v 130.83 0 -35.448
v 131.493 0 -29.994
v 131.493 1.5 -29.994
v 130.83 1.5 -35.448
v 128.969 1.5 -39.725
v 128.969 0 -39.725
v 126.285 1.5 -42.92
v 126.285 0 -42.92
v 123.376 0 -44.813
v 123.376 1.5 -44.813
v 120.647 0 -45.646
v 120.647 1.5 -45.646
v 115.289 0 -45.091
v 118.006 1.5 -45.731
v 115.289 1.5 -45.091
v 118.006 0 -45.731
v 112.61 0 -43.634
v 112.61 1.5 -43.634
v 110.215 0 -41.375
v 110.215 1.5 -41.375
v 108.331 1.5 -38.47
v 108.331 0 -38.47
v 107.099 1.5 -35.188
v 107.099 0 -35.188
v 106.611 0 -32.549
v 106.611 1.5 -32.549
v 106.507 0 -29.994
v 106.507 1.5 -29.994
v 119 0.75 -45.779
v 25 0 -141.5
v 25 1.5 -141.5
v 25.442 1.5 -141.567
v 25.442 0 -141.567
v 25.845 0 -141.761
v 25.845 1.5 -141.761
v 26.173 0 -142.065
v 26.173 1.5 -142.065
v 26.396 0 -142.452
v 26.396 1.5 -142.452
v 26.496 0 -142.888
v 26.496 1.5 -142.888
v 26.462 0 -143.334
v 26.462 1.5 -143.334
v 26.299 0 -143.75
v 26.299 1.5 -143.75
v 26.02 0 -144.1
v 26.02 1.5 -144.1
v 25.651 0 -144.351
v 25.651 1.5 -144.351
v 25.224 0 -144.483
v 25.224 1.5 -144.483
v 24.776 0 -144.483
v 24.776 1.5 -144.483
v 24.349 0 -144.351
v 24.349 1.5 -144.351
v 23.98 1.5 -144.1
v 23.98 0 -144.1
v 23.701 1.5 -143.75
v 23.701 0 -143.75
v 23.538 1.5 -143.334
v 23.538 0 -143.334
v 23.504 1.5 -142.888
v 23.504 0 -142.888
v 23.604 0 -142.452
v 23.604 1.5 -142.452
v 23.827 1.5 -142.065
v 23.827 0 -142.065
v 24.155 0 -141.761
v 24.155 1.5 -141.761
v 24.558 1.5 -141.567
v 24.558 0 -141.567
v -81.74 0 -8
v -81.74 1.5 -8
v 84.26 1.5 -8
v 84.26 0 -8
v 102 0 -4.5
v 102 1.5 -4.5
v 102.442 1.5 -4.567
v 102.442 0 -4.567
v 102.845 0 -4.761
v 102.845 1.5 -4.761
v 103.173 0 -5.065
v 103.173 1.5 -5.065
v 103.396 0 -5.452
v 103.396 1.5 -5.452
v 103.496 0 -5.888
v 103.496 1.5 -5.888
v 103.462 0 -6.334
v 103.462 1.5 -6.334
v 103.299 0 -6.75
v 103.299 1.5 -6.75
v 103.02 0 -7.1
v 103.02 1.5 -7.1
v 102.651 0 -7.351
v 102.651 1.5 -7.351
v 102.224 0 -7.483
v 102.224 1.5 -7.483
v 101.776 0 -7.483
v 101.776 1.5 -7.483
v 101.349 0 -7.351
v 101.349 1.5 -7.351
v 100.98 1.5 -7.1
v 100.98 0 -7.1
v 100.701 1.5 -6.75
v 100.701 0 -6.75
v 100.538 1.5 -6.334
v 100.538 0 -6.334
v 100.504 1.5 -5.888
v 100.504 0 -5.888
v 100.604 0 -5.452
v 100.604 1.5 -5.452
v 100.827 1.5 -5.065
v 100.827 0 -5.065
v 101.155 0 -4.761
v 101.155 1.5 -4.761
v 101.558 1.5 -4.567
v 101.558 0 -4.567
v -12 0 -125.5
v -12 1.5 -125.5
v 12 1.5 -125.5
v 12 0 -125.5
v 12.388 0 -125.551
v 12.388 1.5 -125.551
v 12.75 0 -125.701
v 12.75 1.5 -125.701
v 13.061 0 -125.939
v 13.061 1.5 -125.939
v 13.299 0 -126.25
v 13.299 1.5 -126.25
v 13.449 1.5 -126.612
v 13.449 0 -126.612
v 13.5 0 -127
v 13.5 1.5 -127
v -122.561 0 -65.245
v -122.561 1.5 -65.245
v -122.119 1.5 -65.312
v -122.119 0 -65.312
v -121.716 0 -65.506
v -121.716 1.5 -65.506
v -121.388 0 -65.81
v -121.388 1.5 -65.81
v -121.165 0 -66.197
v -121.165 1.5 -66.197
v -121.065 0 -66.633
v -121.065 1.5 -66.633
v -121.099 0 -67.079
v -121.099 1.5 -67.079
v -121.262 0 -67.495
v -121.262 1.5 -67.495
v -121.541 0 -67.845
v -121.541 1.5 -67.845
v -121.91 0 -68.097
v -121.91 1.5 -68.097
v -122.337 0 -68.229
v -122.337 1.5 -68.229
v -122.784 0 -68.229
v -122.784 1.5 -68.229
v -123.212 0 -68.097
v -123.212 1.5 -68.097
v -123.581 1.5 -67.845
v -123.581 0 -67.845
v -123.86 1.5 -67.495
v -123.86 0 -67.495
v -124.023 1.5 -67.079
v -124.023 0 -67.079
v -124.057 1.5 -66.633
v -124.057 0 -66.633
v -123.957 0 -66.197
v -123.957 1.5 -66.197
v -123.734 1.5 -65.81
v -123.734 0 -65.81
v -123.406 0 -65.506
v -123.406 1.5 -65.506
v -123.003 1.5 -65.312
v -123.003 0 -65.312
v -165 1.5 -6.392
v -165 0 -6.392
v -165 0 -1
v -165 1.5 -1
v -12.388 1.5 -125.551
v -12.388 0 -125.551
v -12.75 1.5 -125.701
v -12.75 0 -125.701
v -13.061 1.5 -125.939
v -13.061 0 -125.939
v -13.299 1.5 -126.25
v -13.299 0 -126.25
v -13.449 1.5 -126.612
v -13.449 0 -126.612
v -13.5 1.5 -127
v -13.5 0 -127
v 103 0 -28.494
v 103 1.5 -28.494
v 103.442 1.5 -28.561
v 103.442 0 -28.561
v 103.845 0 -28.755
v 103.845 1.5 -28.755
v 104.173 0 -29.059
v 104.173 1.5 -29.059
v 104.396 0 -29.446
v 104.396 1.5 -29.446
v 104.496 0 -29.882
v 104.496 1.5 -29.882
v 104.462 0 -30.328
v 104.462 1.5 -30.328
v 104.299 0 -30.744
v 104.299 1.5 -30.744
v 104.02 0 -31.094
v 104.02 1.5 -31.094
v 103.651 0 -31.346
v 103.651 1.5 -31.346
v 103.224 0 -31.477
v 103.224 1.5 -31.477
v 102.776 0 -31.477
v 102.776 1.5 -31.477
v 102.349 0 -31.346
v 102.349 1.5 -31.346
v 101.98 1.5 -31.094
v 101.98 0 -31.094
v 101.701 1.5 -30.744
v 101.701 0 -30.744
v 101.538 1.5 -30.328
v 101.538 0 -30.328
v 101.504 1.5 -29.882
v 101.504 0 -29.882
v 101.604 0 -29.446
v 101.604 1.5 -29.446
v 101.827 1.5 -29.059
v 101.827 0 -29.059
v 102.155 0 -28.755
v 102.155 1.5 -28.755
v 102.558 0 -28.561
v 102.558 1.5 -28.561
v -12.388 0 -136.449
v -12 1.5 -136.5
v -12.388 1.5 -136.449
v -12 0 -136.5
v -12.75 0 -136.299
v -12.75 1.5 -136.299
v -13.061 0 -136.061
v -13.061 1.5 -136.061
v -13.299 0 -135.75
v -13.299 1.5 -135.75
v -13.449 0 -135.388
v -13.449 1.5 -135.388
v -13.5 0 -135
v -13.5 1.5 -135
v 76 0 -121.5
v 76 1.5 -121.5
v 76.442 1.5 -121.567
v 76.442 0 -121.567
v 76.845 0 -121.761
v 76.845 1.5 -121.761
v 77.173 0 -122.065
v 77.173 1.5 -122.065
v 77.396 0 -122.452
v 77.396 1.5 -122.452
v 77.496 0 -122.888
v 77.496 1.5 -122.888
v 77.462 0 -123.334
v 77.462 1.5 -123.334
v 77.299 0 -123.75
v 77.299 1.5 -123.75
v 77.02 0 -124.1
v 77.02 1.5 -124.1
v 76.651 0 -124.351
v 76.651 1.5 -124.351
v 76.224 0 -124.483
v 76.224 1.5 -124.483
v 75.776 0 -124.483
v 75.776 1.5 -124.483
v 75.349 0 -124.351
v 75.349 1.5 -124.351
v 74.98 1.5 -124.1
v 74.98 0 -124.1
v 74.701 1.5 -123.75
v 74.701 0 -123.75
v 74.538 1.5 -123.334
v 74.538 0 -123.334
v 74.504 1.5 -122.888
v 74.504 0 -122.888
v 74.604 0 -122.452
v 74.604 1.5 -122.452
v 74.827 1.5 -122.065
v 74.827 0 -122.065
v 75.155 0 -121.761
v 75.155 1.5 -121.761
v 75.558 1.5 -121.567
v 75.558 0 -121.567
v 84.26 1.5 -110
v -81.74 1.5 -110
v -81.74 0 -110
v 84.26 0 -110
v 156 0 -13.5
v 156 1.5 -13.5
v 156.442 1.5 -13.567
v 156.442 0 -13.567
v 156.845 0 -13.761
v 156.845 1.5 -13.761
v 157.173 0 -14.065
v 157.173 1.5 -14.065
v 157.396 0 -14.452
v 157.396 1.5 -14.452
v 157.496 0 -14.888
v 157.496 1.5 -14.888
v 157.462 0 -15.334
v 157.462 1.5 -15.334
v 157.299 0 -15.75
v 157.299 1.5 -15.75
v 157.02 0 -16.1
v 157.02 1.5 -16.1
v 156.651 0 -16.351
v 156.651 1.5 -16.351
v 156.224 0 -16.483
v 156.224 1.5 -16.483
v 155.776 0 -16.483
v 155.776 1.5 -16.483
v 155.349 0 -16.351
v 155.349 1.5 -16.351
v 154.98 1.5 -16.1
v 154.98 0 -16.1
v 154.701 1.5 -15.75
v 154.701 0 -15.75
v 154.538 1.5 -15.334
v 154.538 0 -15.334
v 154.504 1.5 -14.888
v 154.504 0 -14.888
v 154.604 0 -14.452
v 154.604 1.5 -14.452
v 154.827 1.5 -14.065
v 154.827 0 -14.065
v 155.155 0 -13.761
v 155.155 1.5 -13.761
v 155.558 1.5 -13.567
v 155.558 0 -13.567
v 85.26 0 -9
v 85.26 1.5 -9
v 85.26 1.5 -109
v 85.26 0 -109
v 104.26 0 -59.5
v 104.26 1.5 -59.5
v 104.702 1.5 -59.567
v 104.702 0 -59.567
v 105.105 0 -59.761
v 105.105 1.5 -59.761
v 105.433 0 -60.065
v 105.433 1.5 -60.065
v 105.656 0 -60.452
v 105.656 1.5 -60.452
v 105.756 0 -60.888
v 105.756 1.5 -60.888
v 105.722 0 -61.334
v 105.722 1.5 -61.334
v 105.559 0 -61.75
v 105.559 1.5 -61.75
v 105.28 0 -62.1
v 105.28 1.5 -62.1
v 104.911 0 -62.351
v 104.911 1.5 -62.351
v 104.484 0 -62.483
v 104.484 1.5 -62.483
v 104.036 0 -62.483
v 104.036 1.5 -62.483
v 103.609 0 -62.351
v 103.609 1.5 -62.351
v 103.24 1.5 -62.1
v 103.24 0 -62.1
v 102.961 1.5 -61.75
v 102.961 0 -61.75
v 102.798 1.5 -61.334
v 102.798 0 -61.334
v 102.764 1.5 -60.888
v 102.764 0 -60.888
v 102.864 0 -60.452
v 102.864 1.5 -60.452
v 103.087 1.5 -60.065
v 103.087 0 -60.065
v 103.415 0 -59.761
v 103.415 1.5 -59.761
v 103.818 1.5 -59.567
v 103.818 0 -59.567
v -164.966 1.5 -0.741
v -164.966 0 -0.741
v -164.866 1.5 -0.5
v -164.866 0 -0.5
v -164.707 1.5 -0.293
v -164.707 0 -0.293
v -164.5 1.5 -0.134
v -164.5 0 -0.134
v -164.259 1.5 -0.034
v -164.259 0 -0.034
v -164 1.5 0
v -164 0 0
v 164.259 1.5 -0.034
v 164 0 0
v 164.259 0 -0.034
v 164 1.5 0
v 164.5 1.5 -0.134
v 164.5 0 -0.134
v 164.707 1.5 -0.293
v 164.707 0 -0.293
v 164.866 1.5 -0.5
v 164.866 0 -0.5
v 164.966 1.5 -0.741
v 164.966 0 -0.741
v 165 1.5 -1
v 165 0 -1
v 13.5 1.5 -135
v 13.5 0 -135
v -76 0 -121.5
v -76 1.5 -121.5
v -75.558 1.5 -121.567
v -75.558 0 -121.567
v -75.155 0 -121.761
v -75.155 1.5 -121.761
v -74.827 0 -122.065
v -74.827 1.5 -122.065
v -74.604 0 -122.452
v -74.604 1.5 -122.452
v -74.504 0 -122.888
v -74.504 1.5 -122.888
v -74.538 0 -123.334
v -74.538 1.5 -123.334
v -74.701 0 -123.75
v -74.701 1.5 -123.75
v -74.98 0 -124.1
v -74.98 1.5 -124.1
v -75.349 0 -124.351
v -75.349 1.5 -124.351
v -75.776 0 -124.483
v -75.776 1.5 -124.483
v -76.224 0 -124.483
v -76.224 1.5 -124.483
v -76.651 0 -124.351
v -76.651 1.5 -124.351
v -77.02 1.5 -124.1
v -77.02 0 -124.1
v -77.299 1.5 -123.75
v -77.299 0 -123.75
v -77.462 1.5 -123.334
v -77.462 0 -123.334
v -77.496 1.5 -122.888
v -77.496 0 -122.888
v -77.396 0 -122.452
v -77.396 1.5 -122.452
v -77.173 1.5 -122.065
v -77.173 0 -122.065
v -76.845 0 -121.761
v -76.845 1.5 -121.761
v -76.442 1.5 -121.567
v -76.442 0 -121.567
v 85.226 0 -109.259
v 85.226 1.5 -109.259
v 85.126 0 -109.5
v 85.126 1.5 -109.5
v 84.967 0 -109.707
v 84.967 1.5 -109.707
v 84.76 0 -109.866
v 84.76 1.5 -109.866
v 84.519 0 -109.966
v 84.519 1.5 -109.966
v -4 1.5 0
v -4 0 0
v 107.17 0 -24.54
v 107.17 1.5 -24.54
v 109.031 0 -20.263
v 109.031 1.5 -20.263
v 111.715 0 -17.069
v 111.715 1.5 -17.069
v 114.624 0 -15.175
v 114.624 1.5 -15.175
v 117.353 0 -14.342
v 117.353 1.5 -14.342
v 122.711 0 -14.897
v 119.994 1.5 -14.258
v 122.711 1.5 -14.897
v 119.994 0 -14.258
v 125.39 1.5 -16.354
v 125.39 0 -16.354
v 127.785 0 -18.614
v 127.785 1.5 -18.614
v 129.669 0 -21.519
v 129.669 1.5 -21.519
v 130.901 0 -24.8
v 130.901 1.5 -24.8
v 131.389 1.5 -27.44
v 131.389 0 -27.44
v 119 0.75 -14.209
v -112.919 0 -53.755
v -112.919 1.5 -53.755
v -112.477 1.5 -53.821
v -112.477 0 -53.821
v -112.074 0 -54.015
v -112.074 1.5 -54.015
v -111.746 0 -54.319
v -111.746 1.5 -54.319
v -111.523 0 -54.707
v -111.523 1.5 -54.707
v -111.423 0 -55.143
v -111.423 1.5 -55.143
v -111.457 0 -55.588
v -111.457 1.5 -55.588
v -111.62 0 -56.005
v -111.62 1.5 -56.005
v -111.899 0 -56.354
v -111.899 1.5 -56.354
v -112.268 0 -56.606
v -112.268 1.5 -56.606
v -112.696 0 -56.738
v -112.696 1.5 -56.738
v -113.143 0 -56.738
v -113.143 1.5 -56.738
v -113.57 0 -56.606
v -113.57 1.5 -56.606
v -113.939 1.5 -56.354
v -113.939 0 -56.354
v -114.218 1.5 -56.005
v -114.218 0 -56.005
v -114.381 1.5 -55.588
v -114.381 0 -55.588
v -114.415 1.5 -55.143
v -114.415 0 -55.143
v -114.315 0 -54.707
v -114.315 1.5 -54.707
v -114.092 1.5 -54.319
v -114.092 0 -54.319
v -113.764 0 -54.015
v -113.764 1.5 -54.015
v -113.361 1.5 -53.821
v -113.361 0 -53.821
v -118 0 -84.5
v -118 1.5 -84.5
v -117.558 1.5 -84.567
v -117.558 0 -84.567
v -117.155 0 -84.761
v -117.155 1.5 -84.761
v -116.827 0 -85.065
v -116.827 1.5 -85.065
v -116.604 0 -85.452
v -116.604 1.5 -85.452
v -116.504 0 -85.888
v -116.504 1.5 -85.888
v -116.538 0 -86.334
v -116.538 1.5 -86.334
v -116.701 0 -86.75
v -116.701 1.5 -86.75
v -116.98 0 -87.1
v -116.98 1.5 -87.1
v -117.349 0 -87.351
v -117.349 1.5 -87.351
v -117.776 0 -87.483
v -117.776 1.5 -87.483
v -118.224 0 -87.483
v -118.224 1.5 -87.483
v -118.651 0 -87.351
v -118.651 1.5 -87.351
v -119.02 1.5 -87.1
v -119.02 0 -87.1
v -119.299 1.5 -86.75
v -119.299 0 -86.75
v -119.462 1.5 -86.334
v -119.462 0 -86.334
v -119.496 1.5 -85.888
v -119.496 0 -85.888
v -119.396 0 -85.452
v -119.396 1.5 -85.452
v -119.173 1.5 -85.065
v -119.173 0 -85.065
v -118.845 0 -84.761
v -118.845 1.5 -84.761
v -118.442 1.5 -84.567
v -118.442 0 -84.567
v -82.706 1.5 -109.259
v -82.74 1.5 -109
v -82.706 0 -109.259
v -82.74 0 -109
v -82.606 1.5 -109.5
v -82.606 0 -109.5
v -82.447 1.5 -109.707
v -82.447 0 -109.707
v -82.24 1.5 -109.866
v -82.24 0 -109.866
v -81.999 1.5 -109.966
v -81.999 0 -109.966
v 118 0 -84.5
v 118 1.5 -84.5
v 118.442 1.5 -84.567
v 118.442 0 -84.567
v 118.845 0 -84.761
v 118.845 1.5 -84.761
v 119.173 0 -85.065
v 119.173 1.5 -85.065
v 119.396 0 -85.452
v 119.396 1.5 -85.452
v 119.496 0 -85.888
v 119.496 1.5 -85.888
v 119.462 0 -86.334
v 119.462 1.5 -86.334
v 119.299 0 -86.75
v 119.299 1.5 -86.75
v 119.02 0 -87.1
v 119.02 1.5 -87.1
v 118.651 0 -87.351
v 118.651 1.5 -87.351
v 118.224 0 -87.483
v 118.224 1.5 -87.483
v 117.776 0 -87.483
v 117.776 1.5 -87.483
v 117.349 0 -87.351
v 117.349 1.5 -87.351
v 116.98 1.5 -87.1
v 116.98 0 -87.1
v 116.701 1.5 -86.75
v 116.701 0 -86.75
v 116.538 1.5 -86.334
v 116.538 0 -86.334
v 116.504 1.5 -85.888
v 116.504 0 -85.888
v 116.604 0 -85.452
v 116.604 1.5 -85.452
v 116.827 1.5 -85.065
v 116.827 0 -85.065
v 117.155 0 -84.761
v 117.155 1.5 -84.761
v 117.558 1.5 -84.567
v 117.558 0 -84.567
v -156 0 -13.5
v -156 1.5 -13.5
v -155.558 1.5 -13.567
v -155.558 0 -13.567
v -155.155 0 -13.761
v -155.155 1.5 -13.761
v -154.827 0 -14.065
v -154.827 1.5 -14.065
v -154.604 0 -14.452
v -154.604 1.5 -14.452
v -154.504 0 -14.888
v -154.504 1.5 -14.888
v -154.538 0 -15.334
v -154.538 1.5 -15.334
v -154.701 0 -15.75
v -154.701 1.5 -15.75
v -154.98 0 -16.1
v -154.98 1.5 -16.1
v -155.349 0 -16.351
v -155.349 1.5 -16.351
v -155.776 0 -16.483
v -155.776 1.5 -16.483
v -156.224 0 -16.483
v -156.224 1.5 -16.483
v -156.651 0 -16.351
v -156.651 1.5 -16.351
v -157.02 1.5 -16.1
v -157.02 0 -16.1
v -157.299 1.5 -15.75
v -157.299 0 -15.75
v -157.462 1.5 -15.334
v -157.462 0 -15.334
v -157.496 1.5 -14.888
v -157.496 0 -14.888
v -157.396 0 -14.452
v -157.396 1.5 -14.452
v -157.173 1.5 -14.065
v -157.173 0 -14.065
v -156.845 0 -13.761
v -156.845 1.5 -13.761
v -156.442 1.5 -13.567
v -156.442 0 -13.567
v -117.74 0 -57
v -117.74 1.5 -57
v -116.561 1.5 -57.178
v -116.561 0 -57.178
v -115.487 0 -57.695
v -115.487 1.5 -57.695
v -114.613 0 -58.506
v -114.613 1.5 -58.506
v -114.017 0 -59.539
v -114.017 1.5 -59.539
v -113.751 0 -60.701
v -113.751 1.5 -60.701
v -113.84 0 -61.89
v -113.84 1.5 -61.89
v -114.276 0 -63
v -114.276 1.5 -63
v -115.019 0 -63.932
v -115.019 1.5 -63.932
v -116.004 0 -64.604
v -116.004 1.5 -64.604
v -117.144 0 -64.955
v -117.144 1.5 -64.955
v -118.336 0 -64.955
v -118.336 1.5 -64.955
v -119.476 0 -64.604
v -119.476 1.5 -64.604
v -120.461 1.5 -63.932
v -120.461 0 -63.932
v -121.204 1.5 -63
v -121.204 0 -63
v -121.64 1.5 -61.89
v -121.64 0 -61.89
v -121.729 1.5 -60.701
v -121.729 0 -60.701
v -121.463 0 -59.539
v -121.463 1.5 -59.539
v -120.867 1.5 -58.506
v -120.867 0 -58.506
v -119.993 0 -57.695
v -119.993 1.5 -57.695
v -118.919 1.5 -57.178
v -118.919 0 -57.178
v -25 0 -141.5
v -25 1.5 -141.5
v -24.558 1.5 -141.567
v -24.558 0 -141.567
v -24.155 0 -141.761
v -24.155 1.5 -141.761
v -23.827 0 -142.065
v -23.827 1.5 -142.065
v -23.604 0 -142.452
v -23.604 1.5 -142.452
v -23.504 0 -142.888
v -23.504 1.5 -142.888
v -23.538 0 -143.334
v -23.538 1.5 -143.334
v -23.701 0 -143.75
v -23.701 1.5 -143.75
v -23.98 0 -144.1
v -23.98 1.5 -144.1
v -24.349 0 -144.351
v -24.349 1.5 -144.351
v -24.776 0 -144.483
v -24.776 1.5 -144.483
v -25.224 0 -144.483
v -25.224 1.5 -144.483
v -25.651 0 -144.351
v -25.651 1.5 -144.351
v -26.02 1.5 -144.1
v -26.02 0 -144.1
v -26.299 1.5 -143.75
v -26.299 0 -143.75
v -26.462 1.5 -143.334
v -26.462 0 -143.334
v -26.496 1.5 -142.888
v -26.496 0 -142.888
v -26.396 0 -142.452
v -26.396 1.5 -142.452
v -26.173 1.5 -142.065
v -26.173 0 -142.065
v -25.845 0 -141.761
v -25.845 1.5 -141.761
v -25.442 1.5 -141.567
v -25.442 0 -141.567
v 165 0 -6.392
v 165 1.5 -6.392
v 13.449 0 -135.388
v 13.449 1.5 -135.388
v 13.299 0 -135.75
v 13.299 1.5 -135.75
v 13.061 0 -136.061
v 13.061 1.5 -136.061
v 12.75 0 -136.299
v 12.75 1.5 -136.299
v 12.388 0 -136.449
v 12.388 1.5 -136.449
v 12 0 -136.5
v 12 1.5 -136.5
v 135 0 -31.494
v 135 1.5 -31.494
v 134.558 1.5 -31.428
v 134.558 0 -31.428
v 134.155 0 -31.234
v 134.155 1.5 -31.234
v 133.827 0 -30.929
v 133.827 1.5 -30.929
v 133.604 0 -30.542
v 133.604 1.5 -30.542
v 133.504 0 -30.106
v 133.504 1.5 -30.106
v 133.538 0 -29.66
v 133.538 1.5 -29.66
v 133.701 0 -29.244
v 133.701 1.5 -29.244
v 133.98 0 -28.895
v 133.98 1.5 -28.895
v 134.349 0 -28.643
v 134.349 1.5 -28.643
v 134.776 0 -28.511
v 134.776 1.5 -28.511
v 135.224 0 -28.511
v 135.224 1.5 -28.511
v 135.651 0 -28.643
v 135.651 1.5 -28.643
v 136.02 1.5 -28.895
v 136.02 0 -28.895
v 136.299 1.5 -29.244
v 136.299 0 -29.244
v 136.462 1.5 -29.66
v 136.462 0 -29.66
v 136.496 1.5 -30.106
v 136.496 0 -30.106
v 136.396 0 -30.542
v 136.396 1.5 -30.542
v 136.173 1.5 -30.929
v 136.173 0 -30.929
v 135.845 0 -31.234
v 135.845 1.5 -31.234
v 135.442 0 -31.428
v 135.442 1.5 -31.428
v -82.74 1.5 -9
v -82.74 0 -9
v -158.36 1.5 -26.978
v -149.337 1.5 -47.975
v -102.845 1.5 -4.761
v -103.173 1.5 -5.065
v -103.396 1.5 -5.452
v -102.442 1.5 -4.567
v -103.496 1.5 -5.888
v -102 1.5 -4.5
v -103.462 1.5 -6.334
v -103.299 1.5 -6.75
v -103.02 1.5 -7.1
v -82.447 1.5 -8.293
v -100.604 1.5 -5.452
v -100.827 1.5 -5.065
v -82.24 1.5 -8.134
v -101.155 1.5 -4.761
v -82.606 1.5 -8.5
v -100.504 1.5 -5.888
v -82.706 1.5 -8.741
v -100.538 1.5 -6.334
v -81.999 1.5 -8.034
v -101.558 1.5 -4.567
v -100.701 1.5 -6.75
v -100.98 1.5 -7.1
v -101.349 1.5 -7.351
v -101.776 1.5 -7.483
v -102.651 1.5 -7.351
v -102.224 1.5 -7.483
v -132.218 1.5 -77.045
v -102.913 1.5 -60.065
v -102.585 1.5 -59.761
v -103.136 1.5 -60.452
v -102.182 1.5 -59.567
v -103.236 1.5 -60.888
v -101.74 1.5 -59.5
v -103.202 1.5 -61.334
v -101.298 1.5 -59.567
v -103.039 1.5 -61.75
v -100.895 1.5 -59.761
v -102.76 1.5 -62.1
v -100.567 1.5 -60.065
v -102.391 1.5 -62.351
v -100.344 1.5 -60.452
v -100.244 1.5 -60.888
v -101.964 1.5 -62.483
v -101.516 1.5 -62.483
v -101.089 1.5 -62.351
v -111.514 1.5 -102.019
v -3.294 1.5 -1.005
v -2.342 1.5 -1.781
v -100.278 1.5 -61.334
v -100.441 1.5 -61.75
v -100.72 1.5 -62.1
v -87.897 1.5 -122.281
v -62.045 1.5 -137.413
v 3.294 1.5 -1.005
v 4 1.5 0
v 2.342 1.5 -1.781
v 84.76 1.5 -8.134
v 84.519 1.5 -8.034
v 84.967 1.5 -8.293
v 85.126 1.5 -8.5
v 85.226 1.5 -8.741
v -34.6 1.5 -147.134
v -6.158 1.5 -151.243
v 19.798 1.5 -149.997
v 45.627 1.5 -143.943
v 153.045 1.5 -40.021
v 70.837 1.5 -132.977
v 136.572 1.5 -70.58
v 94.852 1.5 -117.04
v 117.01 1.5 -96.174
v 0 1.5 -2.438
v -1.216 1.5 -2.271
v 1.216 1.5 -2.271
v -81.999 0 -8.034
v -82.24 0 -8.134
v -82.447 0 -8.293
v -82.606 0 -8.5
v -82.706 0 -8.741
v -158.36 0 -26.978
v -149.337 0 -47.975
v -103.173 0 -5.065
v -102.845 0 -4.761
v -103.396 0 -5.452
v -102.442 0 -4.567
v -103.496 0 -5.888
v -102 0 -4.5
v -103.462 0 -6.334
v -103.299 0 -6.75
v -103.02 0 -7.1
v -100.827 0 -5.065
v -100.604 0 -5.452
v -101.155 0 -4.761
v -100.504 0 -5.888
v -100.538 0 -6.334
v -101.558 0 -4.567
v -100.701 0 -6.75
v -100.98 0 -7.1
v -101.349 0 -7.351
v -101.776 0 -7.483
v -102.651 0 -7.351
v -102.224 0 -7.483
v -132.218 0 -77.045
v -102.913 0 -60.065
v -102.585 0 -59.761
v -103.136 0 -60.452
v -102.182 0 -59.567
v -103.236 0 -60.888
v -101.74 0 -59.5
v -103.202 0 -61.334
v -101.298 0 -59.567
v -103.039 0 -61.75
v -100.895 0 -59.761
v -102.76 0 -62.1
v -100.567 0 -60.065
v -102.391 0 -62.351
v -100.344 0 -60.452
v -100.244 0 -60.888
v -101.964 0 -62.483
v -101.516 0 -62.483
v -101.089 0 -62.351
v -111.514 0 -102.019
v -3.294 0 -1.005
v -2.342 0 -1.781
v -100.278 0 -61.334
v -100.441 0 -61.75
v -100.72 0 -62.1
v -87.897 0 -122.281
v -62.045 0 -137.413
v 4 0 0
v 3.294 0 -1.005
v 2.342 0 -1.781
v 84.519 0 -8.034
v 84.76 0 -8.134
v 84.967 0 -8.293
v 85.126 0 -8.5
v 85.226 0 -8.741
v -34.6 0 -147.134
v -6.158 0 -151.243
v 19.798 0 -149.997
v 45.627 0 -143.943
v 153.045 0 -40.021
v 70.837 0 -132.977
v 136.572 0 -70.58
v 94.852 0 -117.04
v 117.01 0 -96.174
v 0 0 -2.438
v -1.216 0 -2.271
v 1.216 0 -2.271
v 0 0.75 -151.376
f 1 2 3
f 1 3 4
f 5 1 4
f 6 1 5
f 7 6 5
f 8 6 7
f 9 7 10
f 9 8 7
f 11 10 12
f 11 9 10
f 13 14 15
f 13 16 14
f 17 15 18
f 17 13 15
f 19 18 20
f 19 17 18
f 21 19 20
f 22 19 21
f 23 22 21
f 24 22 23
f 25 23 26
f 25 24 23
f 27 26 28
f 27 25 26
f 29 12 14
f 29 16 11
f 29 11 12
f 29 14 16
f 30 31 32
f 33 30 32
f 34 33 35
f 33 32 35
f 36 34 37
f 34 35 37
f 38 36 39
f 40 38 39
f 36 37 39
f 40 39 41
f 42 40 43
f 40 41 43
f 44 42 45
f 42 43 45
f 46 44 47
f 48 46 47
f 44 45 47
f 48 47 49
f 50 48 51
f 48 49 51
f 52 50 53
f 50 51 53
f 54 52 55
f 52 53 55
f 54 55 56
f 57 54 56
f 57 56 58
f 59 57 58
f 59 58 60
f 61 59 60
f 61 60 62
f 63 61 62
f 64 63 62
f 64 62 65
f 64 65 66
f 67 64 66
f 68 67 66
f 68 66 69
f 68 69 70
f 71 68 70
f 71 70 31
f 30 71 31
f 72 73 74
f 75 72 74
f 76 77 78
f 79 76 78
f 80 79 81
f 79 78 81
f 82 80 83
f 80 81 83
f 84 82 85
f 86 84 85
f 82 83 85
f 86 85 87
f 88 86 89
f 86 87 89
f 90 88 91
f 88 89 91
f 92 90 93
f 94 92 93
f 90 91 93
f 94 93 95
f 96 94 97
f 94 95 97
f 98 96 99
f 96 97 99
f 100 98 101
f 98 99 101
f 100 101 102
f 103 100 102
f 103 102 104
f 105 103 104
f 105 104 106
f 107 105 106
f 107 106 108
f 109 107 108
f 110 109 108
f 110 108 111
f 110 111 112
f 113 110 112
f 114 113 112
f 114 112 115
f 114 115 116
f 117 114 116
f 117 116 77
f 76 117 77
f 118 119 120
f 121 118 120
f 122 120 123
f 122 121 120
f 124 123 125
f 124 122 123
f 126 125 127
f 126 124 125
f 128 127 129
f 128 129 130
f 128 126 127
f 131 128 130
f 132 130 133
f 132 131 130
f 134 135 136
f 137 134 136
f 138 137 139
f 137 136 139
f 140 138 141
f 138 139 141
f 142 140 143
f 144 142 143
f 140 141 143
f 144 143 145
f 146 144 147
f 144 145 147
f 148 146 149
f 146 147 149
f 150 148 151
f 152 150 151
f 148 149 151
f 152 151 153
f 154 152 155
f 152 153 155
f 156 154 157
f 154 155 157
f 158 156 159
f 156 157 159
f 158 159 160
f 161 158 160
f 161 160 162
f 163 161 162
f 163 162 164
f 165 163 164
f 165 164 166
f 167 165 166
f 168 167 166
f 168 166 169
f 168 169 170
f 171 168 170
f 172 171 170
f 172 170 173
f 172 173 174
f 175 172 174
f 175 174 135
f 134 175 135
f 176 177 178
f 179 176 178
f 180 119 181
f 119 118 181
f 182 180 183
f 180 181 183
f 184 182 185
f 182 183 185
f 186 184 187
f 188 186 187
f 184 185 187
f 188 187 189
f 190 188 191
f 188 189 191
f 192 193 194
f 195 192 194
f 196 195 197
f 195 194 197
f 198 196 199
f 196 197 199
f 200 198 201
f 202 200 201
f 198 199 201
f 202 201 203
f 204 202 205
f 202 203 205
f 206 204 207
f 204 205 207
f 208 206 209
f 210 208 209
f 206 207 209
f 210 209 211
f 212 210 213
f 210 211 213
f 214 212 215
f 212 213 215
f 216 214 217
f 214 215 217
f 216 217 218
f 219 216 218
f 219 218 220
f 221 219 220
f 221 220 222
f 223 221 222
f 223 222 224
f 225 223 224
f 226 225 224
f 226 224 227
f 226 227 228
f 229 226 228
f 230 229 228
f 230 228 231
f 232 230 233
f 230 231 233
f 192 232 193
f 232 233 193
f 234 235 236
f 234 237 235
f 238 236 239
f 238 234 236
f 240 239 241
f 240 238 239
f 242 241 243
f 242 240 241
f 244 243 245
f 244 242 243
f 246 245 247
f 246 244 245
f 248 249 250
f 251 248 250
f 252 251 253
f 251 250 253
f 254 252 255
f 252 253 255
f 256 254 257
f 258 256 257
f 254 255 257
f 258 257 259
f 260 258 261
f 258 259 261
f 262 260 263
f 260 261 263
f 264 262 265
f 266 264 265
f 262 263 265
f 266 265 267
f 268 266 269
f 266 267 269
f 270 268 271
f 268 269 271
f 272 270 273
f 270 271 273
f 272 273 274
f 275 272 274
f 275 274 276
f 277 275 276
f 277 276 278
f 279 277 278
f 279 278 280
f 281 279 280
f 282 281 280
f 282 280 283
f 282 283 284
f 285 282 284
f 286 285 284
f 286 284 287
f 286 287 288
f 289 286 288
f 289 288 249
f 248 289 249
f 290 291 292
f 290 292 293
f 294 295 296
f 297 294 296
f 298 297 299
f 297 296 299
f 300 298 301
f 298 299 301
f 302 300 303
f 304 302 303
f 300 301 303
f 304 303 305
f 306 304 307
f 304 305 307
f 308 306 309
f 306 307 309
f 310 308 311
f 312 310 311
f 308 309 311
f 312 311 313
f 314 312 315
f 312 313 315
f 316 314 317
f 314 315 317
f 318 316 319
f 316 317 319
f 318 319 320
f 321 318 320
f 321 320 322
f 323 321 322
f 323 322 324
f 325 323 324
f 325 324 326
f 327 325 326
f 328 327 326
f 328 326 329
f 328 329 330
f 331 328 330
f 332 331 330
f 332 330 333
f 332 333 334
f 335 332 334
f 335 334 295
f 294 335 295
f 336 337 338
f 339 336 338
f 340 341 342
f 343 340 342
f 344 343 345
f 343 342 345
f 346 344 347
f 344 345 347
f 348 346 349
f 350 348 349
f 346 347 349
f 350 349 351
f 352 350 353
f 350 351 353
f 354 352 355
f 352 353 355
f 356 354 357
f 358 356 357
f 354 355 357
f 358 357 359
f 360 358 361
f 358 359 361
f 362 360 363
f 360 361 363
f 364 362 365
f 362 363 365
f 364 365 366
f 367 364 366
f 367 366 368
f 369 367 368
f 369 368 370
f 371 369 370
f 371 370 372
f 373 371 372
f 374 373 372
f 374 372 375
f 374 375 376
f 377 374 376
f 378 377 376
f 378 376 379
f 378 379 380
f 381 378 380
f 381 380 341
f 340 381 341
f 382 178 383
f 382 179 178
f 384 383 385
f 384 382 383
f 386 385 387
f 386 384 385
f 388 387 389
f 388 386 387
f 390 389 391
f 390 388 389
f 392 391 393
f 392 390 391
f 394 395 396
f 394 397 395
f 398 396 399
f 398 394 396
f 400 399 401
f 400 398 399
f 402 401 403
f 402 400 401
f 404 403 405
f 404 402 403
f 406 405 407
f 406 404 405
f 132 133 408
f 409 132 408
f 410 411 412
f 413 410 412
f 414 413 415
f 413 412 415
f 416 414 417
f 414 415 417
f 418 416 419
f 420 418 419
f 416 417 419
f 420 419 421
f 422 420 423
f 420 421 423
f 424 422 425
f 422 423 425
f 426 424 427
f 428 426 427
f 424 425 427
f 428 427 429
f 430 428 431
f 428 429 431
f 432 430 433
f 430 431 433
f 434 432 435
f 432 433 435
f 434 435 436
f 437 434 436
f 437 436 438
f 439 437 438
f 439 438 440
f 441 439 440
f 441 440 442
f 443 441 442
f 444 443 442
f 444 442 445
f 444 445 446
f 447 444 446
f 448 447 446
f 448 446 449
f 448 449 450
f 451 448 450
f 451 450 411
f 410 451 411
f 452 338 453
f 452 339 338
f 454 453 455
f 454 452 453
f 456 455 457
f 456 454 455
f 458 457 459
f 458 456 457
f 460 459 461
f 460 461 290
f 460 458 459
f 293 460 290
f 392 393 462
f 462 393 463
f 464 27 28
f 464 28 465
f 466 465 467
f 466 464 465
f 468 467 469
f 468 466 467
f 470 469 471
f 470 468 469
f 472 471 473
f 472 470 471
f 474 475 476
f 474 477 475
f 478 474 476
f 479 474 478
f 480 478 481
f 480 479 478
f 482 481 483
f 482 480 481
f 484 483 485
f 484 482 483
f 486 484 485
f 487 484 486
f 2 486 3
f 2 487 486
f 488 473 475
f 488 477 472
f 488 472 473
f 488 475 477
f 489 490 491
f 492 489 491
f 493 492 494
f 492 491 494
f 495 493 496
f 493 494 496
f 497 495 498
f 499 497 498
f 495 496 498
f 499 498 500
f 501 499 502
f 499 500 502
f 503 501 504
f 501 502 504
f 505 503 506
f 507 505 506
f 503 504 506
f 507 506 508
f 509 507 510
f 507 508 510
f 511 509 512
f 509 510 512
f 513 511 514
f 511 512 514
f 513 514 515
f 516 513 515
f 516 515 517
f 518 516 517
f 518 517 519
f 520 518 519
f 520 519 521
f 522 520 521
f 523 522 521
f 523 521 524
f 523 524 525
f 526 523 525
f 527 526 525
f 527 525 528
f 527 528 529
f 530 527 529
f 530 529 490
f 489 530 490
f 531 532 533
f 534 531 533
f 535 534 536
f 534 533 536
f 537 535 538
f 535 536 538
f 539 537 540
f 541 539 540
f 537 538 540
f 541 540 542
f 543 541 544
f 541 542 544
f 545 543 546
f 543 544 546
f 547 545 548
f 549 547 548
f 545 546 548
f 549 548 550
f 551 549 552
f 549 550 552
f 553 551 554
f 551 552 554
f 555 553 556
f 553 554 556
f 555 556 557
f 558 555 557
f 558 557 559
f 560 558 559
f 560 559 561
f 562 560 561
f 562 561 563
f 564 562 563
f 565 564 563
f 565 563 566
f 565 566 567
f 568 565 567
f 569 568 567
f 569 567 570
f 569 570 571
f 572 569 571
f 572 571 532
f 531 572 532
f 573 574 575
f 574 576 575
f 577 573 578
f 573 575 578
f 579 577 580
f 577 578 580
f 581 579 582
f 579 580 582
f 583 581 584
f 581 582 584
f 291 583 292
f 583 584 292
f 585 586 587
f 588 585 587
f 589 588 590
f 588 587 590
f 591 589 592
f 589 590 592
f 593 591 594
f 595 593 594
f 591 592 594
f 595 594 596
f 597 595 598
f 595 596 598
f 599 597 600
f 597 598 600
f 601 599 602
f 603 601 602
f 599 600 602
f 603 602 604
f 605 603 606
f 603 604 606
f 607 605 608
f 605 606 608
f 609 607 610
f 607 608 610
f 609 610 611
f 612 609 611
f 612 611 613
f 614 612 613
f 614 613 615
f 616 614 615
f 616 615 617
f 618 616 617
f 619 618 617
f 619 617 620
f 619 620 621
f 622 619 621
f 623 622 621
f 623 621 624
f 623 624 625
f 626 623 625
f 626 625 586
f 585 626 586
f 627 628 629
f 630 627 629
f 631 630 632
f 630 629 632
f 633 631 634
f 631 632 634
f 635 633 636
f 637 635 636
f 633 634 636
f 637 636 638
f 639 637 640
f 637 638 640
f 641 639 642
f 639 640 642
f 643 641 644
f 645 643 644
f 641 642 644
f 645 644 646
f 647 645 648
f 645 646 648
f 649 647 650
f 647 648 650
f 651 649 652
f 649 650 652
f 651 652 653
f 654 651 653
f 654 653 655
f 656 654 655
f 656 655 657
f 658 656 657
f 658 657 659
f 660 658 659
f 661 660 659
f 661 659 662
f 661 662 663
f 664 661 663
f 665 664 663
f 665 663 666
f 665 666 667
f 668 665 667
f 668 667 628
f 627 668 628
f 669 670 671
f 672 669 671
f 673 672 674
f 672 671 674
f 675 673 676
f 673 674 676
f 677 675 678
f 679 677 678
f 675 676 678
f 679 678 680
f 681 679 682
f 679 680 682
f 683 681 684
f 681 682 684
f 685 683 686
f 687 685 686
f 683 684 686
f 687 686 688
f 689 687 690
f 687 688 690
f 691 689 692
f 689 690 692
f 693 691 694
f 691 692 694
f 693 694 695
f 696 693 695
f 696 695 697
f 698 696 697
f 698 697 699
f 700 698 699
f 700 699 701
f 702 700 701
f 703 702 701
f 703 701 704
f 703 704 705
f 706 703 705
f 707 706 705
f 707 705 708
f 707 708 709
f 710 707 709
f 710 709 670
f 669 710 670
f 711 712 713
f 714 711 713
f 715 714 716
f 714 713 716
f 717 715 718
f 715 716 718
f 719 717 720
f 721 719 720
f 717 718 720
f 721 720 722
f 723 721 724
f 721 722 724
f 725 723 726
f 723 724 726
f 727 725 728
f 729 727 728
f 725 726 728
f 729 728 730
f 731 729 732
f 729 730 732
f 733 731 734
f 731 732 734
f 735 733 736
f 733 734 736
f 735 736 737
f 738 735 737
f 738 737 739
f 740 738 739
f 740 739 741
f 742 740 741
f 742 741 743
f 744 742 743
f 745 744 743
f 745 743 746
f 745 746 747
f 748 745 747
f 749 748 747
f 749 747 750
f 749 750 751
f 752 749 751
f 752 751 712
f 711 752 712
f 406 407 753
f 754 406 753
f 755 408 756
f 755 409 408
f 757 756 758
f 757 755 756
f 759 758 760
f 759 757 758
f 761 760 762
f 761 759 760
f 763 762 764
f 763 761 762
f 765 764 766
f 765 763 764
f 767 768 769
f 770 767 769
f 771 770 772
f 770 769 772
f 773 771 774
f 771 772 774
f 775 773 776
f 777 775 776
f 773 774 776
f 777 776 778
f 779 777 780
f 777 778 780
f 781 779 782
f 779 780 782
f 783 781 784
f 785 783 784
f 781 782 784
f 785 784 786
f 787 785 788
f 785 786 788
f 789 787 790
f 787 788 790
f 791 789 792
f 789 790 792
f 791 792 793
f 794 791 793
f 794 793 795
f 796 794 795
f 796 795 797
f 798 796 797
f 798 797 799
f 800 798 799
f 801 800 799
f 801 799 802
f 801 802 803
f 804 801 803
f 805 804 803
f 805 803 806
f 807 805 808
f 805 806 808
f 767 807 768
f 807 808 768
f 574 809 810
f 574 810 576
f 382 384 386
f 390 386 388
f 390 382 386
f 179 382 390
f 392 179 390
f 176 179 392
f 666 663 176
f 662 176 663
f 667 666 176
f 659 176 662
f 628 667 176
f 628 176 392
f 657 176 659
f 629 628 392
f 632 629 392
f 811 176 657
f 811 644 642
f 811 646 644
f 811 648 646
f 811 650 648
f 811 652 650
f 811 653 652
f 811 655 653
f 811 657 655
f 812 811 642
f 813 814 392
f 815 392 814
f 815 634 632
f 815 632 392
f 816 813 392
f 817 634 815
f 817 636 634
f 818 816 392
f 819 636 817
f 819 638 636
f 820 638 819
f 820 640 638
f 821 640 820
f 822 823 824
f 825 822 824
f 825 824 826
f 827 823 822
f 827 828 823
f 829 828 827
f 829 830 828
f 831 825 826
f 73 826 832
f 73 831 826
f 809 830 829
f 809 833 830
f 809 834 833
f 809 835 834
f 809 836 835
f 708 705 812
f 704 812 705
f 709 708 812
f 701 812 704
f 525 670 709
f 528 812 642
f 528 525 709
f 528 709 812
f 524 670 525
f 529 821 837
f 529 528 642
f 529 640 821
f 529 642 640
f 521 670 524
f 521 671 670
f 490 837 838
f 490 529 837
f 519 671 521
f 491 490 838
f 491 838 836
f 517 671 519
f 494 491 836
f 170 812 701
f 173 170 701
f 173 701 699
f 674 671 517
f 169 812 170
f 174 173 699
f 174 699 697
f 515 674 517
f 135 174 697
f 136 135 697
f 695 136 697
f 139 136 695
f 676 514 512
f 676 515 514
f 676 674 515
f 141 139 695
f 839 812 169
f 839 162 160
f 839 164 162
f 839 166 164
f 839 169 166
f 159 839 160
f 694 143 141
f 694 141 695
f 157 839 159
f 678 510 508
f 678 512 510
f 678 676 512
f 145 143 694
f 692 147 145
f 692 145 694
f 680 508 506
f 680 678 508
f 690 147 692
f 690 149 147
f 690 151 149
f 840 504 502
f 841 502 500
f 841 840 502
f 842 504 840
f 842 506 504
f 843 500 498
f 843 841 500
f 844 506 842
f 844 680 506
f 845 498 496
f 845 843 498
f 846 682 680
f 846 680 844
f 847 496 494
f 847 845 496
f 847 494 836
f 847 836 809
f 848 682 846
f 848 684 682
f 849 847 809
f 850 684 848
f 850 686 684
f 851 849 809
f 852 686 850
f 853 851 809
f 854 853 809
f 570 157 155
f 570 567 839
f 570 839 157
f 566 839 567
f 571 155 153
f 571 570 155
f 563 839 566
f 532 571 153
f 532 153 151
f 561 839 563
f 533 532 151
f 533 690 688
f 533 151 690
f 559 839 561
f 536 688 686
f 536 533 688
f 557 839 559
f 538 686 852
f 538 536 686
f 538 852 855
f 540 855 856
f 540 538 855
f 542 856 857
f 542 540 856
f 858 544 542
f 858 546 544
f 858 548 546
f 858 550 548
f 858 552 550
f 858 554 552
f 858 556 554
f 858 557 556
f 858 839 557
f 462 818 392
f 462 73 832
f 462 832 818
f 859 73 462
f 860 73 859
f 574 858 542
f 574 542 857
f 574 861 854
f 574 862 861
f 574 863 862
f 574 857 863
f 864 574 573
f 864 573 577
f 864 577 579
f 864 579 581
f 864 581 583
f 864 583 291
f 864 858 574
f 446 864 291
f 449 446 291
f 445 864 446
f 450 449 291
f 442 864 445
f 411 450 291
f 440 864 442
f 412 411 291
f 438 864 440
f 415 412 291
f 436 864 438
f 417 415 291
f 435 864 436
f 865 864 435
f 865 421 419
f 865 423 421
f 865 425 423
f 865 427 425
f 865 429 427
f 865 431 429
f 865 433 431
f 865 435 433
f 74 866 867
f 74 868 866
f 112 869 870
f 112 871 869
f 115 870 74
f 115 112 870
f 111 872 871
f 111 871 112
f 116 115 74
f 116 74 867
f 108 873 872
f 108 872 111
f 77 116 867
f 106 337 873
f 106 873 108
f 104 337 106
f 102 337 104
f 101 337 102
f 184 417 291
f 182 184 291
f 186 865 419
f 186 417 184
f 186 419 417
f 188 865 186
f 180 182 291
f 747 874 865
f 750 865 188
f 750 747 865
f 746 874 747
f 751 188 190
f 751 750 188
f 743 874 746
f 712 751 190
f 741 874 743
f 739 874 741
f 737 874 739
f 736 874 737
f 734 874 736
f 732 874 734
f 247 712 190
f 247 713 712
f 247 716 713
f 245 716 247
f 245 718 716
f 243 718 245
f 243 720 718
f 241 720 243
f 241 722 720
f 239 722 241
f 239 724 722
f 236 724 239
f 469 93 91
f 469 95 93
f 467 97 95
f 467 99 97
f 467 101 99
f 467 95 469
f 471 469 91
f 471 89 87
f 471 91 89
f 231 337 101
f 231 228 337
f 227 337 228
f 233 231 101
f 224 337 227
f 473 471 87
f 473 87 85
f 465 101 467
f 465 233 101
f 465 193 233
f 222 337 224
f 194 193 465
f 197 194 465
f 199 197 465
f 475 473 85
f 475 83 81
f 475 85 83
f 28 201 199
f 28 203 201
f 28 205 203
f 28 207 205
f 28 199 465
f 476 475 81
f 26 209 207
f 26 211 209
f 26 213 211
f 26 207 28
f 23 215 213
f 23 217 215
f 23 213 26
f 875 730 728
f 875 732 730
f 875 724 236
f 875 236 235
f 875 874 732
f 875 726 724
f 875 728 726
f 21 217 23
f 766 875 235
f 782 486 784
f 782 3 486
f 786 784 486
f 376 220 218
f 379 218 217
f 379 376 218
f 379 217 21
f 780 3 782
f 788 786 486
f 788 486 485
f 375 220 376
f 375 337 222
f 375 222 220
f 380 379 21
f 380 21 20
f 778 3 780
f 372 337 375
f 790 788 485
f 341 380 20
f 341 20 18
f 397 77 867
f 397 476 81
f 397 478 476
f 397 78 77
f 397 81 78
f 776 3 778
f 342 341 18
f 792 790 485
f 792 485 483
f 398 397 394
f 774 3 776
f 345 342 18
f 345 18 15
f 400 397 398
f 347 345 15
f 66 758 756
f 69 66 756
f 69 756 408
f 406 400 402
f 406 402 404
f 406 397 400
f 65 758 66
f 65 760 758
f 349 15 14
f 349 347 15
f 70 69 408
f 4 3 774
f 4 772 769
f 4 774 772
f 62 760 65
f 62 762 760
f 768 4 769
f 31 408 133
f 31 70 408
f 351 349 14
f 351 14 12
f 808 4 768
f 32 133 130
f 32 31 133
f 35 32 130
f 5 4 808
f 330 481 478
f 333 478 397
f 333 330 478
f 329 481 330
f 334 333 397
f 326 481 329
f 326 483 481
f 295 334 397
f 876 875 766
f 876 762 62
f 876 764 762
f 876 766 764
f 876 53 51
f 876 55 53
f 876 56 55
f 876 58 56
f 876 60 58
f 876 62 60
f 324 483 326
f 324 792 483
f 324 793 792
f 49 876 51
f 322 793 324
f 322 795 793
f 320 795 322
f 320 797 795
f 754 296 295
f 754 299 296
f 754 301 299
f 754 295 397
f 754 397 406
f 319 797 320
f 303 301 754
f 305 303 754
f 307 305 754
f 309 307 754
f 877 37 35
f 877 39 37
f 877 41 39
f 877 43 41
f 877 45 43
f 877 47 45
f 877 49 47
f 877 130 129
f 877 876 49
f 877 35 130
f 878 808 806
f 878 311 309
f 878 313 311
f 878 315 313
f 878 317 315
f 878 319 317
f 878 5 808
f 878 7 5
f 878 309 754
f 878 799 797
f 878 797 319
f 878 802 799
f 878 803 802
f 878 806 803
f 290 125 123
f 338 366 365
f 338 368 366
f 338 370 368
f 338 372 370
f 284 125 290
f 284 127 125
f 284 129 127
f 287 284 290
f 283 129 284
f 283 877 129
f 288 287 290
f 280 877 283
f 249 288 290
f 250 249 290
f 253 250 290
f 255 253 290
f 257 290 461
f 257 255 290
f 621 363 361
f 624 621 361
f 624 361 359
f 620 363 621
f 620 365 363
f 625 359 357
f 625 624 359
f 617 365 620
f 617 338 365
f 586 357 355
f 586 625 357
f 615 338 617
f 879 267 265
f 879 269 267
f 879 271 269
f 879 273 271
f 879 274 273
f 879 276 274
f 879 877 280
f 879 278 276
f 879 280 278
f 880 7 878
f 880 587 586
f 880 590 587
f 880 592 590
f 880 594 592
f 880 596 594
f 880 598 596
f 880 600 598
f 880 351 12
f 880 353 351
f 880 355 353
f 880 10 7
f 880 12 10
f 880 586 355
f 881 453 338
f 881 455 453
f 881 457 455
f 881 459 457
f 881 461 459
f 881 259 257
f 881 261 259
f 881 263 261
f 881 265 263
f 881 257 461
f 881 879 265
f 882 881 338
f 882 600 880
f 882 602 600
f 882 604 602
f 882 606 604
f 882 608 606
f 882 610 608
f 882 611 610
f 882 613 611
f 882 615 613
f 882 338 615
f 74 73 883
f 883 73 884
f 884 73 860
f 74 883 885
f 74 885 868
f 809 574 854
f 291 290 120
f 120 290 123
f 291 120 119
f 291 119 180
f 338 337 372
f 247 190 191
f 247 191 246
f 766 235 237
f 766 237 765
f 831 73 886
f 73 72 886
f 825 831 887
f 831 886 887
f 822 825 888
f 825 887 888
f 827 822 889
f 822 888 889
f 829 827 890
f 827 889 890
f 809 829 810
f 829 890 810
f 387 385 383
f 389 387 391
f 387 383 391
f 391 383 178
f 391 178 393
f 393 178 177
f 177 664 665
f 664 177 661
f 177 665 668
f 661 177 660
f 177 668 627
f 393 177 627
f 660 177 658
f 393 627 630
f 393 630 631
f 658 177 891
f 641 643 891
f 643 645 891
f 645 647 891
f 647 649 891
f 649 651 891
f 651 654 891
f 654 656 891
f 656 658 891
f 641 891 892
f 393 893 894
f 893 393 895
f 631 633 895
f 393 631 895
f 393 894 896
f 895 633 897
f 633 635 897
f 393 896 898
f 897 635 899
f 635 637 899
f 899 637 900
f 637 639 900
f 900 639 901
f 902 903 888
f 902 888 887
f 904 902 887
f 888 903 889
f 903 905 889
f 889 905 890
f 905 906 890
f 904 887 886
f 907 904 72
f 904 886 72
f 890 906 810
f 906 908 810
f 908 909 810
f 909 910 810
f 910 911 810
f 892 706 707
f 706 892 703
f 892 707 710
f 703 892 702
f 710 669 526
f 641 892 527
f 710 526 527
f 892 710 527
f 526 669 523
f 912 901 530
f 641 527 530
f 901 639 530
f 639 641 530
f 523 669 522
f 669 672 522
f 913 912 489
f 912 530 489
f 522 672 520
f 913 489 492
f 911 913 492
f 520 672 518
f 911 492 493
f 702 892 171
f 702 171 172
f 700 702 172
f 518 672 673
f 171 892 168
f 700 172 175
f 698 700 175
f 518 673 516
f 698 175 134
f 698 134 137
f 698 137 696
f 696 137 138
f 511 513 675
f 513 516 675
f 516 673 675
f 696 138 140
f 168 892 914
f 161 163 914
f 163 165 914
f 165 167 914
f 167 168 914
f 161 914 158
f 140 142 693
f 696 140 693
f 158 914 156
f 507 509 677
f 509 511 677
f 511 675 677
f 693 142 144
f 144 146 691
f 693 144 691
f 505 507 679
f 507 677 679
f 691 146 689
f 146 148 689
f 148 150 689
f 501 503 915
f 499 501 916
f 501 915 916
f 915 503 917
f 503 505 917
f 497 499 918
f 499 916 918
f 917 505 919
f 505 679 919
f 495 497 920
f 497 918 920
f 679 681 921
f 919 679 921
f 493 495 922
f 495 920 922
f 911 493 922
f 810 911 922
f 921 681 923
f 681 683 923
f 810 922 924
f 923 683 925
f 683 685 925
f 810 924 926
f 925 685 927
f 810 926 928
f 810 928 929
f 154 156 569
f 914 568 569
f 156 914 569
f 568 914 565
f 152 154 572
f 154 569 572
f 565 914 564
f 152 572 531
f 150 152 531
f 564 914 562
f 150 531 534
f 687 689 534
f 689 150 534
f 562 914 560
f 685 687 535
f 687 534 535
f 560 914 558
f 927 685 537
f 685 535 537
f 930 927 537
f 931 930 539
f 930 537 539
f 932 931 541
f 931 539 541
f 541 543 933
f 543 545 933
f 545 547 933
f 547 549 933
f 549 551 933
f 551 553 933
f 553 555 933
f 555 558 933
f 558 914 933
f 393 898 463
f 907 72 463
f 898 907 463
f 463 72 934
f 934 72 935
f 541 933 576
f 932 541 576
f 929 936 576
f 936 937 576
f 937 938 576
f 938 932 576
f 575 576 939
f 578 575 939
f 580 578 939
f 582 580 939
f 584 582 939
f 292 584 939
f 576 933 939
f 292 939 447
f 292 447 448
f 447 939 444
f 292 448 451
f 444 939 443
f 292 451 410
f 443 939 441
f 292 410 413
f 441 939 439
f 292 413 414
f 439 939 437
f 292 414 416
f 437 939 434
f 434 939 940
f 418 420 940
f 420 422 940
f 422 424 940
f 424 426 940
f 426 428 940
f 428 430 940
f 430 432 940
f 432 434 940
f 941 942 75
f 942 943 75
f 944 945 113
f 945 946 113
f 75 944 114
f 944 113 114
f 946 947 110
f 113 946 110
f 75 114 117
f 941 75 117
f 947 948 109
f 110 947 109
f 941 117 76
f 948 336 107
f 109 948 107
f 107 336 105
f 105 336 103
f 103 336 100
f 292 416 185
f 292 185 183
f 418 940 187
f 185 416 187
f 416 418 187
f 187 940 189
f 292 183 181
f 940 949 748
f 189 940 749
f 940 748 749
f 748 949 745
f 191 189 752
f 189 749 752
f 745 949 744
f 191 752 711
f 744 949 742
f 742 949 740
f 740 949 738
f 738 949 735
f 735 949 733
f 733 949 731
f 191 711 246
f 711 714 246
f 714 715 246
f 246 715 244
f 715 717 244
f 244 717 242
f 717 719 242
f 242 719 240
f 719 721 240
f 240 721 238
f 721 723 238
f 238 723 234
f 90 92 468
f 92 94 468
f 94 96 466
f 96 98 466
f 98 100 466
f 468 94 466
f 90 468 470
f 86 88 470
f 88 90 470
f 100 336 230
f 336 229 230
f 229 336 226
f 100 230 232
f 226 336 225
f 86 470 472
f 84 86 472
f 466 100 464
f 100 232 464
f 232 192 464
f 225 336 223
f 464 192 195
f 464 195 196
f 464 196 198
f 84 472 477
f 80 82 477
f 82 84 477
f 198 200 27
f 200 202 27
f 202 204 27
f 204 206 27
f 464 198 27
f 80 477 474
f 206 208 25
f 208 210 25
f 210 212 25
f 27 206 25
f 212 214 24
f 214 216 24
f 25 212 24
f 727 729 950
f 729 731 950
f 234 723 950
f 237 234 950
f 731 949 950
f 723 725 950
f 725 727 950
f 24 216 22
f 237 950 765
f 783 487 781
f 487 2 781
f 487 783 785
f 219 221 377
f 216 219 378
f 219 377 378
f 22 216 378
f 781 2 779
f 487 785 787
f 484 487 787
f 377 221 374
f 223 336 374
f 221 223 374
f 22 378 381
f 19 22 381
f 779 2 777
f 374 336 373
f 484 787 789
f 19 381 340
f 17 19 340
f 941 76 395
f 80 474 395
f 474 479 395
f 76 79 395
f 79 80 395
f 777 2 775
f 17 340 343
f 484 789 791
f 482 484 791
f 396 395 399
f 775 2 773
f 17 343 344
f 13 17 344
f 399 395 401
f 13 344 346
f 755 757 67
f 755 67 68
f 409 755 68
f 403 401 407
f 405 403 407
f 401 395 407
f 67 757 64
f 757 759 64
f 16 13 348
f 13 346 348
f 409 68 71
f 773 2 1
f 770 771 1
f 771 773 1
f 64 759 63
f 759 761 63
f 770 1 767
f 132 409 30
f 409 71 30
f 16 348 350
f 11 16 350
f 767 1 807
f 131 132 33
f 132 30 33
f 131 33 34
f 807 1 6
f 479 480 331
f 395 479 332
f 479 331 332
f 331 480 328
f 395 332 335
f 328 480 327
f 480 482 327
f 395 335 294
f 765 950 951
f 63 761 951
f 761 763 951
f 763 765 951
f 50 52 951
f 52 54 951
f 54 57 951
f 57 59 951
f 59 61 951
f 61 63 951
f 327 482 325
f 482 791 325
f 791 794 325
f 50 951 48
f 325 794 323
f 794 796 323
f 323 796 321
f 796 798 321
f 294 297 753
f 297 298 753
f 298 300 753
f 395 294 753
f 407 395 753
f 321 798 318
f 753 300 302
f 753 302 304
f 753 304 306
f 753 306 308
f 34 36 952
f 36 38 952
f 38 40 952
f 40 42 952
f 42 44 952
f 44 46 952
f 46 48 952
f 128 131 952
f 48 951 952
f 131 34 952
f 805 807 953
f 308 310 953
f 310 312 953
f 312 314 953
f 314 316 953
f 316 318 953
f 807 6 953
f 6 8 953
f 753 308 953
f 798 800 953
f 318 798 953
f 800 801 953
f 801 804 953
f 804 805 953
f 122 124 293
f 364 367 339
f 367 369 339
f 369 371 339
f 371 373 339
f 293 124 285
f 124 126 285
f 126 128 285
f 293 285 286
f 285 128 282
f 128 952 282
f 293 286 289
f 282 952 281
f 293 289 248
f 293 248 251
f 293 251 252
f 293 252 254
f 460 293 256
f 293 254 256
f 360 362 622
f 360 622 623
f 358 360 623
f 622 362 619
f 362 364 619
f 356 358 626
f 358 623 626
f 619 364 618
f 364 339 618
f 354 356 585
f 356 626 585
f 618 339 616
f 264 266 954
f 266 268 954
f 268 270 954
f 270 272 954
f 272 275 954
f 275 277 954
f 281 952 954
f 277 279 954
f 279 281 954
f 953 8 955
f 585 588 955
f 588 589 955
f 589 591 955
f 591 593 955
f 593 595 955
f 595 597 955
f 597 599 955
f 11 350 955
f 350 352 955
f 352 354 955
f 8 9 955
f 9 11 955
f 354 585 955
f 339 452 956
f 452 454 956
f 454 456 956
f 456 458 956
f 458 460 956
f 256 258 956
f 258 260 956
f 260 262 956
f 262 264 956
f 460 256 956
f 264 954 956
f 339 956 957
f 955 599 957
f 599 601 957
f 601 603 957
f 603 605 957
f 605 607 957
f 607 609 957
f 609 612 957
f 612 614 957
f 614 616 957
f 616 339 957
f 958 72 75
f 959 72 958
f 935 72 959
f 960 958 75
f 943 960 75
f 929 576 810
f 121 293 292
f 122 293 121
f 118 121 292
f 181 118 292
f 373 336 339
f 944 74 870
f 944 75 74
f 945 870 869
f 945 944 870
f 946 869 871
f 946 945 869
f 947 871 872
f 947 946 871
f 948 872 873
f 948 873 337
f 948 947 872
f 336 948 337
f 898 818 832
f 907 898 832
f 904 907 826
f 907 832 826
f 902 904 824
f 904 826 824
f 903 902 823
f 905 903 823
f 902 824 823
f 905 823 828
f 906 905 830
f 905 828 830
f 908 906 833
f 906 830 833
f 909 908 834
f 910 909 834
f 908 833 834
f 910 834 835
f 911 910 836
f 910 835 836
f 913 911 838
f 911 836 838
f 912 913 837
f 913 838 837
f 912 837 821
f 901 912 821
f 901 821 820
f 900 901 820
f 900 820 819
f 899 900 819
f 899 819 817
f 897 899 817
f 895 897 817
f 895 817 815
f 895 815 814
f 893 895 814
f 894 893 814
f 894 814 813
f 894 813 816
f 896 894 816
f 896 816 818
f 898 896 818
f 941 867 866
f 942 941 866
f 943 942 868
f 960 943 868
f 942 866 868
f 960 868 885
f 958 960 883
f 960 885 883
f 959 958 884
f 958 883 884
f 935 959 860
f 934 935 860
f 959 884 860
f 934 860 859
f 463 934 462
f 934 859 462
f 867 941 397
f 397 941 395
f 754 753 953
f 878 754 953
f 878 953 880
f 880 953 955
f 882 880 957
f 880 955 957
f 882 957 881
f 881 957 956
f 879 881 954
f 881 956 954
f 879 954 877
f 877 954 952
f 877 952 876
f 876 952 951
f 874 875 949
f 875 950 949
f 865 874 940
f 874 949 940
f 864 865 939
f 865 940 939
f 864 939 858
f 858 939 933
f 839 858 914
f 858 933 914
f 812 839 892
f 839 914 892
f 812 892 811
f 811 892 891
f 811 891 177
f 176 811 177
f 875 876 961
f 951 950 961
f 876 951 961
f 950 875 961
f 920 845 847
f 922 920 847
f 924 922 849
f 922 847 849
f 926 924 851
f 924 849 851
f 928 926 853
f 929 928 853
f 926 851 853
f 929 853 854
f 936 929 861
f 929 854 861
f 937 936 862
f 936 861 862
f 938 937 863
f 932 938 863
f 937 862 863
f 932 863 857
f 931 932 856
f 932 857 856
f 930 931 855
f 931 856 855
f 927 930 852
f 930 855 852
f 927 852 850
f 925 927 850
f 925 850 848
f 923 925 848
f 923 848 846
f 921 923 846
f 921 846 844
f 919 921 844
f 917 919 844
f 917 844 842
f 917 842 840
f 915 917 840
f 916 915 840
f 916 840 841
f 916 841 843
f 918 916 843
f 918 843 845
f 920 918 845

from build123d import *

# Parameters (mm, degrees)
BOSS_EXTRU_1_DEPTH      = 1.5
ESQUISSE4_R             = 4
ESQUISSE4_R_2           = 1.5
ESQUISSE4_W             = 168
ESQUISSE4_H             = 102
ENL_V_MAT_EXTRU_3_DEPTH = 3
ENL_V_MAT_EXTRU_4_DEPTH = 1.5
ESQUISSE11_R            = 1.5
ENL_V_MAT_EXTRU_5_DEPTH = 1.5
CONG_1_R                = 1
ESQUISSE12_R            = 1.5
ENL_V_MAT_EXTRU_6_DEPTH = 224.924001117
ESQUISSE14_W            = 27
ESQUISSE14_H            = 11
ENL_V_MAT_EXTRU_7_DEPTH = 1.5
CONG_2_R                = 1.5


# Read off the part's stored shape, not the designer's step: Enlèv. mat.-Extru.4
with BuildPart() as part:
    # Esquisse1 → Boss.-Extru.1 (new body)
    with BuildSketch(Plane(origin=(0, 0, 0), x_dir=(1, 0, 0), z_dir=(0, 1, 0))):
        with BuildLine():
            Line((-165, 6.391802297), (-165, 0))
            Line((-165, 0), (165, 0))
            Line((165, 0), (165, 6.391802297))
            add(Edge.make_bspline(
                [(165, 6.391802297), (0, 608.094924715), (-165, 6.391802297)],
                knots=[1.893832827, 1.893832827, 1.893832827, 4.38935248, 4.38935248, 4.38935248], degree=2, weights=[1, 0.317447459, 1]))
        make_face()
    extrude(amount=BOSS_EXTRU_1_DEPTH)

    # Esquisse4 → Enlèv. mat.-Extru.3 (cut)
    with BuildSketch(Plane(origin=(0, 1.5, 0), x_dir=(1, 0, 0), z_dir=(0, 1, 0))):
        with Locations(Location((-117.74, 61, 0), (0, 0, 270))):
            Circle(ESQUISSE4_R)
        with Locations(Location((-112.919092927, 55.254666677, 0), (0, 0, 270))):
            Circle(ESQUISSE4_R_2)
        with Locations(Location((-122.560907073, 66.745333323, 0), (0, 0, 270))):
            Circle(ESQUISSE4_R_2)
        with Locations(Location((-101.74, 61, 0), (0, 0, 270))):
            Circle(ESQUISSE4_R_2)
        with Locations(Location((104.26, 61, 0), (0, 0, 270))):
            Circle(ESQUISSE4_R_2)
        with Locations((1.26, 59)):
            Rectangle(ESQUISSE4_W, ESQUISSE4_H)
    extrude(amount=-ENL_V_MAT_EXTRU_3_DEPTH, mode=Mode.SUBTRACT)

    # Enlèv. mat.-Extru.4 outline → Enlèv. mat.-Extru.4 (cut)
    with BuildSketch(Plane(origin=(0, 0, 0), x_dir=(1, 0, 0), z_dir=(0, 1, 0))):
        with BuildLine():
            add(Edge.make_bspline(
                [(131.492595534, 29.994209065), (131.937846155, 45.779047079), (119, 45.779047079), (106.062153845, 45.779047079), (106.507404466, 29.994209065)],
                knots=[1.536374944, 1.536374944, 1.536374944, 3.141592654, 3.141592654, 4.746810363, 4.746810363, 4.746810363], degree=2, weights=[1, 0.694832863, 1, 0.694832863, 1]))
            add(Edge.make_bspline(
                [(106.507404466, 29.994209065), (106.062153845, 14.209371052), (119, 14.209371052), (131.937846155, 14.209371052), (131.492595534, 29.994209065)],
                knots=[4.677967597, 4.677967597, 4.677967597, 6.283185307, 6.283185307, 7.888403017, 7.888403017, 7.888403017], degree=2, weights=[1, 0.694832863, 1, 0.694832863, 1]))
        make_face()
    extrude(amount=ENL_V_MAT_EXTRU_4_DEPTH, mode=Mode.SUBTRACT)

    # Esquisse11 → Enlèv. mat.-Extru.5 (cut)
    with BuildSketch(Plane(origin=(0, 1.5, 0), x_dir=(1, 0, 0), z_dir=(0, 1, 0))):
        with Locations(Location((103, 29.994209065, 0), (0, 0, 270))):
            Circle(ESQUISSE11_R)
        with Locations(Location((135, 29.994209065, 0), (0, 0, 90))):
            Circle(ESQUISSE11_R)
    extrude(amount=-ENL_V_MAT_EXTRU_5_DEPTH, mode=Mode.SUBTRACT)

    # Congé1
    cong_1_edges = [part.edges().sort_by_distance(p)[0] for p in [
        (-82.74, 0.75, -110),
        (-82.74, 0.75, -8),
        (85.26, 0.75, -8),
        (85.26, 0.75, -110),
        (165, 0.75, 0),
        (-165, 0.75, 0),
    ]]
    fillet(cong_1_edges, radius=CONG_1_R)

    # Esquisse12 → Enlèv. mat.-Extru.6 (cut, through all)
    with BuildSketch(Plane(origin=(0, 1.5, 0), x_dir=(1, 0, 0), z_dir=(0, 1, 0))):
        with Locations(Location((-156, 15, 0), (0, 0, 270))):
            Circle(ESQUISSE12_R)
        with Locations(Location((-76, 123, 0), (0, 0, 270))):
            Circle(ESQUISSE12_R)
        with Locations(Location((-25, 143, 0), (0, 0, 270))):
            Circle(ESQUISSE12_R)
        with Locations(Location((25, 143, 0), (0, 0, 270))):
            Circle(ESQUISSE12_R)
        with Locations(Location((76, 123, 0), (0, 0, 270))):
            Circle(ESQUISSE12_R)
        with Locations(Location((156, 15, 0), (0, 0, 270))):
            Circle(ESQUISSE12_R)
        with Locations(Location((-102, 6, 0), (0, 0, 270))):
            Circle(ESQUISSE12_R)
        with Locations(Location((102, 6, 0), (0, 0, 270))):
            Circle(ESQUISSE12_R)
        with Locations(Location((-118, 86, 0), (0, 0, 270))):
            Circle(ESQUISSE12_R)
        with Locations(Location((118, 86, 0), (0, 0, 270))):
            Circle(ESQUISSE12_R)
        with BuildLine():
            Line((-4, 0), (4, 0))
            ThreePointArc((4, 0), (0, 2.438447187), (-4, 0))
        make_face()
    extrude(amount=-ENL_V_MAT_EXTRU_6_DEPTH, mode=Mode.SUBTRACT)

    # Esquisse14 → Enlèv. mat.-Extru.7 (cut)
    with BuildSketch(Plane(origin=(0, 1.5, 0), x_dir=(1, 0, 0), z_dir=(0, 1, 0))):
        with Locations((0, 131)):
            Rectangle(ESQUISSE14_W, ESQUISSE14_H)
    extrude(amount=-ENL_V_MAT_EXTRU_7_DEPTH, mode=Mode.SUBTRACT)

    # Congé2
    cong_2_edges = [part.edges().sort_by_distance(p)[0] for p in [
        (-13.5, 0.75, -125.5),
        (-13.5, 0.75, -136.5),
        (13.5, 0.75, -136.5),
        (13.5, 0.75, -125.5),
    ]]
    fillet(cong_2_edges, radius=CONG_2_R)


solid = part.part
